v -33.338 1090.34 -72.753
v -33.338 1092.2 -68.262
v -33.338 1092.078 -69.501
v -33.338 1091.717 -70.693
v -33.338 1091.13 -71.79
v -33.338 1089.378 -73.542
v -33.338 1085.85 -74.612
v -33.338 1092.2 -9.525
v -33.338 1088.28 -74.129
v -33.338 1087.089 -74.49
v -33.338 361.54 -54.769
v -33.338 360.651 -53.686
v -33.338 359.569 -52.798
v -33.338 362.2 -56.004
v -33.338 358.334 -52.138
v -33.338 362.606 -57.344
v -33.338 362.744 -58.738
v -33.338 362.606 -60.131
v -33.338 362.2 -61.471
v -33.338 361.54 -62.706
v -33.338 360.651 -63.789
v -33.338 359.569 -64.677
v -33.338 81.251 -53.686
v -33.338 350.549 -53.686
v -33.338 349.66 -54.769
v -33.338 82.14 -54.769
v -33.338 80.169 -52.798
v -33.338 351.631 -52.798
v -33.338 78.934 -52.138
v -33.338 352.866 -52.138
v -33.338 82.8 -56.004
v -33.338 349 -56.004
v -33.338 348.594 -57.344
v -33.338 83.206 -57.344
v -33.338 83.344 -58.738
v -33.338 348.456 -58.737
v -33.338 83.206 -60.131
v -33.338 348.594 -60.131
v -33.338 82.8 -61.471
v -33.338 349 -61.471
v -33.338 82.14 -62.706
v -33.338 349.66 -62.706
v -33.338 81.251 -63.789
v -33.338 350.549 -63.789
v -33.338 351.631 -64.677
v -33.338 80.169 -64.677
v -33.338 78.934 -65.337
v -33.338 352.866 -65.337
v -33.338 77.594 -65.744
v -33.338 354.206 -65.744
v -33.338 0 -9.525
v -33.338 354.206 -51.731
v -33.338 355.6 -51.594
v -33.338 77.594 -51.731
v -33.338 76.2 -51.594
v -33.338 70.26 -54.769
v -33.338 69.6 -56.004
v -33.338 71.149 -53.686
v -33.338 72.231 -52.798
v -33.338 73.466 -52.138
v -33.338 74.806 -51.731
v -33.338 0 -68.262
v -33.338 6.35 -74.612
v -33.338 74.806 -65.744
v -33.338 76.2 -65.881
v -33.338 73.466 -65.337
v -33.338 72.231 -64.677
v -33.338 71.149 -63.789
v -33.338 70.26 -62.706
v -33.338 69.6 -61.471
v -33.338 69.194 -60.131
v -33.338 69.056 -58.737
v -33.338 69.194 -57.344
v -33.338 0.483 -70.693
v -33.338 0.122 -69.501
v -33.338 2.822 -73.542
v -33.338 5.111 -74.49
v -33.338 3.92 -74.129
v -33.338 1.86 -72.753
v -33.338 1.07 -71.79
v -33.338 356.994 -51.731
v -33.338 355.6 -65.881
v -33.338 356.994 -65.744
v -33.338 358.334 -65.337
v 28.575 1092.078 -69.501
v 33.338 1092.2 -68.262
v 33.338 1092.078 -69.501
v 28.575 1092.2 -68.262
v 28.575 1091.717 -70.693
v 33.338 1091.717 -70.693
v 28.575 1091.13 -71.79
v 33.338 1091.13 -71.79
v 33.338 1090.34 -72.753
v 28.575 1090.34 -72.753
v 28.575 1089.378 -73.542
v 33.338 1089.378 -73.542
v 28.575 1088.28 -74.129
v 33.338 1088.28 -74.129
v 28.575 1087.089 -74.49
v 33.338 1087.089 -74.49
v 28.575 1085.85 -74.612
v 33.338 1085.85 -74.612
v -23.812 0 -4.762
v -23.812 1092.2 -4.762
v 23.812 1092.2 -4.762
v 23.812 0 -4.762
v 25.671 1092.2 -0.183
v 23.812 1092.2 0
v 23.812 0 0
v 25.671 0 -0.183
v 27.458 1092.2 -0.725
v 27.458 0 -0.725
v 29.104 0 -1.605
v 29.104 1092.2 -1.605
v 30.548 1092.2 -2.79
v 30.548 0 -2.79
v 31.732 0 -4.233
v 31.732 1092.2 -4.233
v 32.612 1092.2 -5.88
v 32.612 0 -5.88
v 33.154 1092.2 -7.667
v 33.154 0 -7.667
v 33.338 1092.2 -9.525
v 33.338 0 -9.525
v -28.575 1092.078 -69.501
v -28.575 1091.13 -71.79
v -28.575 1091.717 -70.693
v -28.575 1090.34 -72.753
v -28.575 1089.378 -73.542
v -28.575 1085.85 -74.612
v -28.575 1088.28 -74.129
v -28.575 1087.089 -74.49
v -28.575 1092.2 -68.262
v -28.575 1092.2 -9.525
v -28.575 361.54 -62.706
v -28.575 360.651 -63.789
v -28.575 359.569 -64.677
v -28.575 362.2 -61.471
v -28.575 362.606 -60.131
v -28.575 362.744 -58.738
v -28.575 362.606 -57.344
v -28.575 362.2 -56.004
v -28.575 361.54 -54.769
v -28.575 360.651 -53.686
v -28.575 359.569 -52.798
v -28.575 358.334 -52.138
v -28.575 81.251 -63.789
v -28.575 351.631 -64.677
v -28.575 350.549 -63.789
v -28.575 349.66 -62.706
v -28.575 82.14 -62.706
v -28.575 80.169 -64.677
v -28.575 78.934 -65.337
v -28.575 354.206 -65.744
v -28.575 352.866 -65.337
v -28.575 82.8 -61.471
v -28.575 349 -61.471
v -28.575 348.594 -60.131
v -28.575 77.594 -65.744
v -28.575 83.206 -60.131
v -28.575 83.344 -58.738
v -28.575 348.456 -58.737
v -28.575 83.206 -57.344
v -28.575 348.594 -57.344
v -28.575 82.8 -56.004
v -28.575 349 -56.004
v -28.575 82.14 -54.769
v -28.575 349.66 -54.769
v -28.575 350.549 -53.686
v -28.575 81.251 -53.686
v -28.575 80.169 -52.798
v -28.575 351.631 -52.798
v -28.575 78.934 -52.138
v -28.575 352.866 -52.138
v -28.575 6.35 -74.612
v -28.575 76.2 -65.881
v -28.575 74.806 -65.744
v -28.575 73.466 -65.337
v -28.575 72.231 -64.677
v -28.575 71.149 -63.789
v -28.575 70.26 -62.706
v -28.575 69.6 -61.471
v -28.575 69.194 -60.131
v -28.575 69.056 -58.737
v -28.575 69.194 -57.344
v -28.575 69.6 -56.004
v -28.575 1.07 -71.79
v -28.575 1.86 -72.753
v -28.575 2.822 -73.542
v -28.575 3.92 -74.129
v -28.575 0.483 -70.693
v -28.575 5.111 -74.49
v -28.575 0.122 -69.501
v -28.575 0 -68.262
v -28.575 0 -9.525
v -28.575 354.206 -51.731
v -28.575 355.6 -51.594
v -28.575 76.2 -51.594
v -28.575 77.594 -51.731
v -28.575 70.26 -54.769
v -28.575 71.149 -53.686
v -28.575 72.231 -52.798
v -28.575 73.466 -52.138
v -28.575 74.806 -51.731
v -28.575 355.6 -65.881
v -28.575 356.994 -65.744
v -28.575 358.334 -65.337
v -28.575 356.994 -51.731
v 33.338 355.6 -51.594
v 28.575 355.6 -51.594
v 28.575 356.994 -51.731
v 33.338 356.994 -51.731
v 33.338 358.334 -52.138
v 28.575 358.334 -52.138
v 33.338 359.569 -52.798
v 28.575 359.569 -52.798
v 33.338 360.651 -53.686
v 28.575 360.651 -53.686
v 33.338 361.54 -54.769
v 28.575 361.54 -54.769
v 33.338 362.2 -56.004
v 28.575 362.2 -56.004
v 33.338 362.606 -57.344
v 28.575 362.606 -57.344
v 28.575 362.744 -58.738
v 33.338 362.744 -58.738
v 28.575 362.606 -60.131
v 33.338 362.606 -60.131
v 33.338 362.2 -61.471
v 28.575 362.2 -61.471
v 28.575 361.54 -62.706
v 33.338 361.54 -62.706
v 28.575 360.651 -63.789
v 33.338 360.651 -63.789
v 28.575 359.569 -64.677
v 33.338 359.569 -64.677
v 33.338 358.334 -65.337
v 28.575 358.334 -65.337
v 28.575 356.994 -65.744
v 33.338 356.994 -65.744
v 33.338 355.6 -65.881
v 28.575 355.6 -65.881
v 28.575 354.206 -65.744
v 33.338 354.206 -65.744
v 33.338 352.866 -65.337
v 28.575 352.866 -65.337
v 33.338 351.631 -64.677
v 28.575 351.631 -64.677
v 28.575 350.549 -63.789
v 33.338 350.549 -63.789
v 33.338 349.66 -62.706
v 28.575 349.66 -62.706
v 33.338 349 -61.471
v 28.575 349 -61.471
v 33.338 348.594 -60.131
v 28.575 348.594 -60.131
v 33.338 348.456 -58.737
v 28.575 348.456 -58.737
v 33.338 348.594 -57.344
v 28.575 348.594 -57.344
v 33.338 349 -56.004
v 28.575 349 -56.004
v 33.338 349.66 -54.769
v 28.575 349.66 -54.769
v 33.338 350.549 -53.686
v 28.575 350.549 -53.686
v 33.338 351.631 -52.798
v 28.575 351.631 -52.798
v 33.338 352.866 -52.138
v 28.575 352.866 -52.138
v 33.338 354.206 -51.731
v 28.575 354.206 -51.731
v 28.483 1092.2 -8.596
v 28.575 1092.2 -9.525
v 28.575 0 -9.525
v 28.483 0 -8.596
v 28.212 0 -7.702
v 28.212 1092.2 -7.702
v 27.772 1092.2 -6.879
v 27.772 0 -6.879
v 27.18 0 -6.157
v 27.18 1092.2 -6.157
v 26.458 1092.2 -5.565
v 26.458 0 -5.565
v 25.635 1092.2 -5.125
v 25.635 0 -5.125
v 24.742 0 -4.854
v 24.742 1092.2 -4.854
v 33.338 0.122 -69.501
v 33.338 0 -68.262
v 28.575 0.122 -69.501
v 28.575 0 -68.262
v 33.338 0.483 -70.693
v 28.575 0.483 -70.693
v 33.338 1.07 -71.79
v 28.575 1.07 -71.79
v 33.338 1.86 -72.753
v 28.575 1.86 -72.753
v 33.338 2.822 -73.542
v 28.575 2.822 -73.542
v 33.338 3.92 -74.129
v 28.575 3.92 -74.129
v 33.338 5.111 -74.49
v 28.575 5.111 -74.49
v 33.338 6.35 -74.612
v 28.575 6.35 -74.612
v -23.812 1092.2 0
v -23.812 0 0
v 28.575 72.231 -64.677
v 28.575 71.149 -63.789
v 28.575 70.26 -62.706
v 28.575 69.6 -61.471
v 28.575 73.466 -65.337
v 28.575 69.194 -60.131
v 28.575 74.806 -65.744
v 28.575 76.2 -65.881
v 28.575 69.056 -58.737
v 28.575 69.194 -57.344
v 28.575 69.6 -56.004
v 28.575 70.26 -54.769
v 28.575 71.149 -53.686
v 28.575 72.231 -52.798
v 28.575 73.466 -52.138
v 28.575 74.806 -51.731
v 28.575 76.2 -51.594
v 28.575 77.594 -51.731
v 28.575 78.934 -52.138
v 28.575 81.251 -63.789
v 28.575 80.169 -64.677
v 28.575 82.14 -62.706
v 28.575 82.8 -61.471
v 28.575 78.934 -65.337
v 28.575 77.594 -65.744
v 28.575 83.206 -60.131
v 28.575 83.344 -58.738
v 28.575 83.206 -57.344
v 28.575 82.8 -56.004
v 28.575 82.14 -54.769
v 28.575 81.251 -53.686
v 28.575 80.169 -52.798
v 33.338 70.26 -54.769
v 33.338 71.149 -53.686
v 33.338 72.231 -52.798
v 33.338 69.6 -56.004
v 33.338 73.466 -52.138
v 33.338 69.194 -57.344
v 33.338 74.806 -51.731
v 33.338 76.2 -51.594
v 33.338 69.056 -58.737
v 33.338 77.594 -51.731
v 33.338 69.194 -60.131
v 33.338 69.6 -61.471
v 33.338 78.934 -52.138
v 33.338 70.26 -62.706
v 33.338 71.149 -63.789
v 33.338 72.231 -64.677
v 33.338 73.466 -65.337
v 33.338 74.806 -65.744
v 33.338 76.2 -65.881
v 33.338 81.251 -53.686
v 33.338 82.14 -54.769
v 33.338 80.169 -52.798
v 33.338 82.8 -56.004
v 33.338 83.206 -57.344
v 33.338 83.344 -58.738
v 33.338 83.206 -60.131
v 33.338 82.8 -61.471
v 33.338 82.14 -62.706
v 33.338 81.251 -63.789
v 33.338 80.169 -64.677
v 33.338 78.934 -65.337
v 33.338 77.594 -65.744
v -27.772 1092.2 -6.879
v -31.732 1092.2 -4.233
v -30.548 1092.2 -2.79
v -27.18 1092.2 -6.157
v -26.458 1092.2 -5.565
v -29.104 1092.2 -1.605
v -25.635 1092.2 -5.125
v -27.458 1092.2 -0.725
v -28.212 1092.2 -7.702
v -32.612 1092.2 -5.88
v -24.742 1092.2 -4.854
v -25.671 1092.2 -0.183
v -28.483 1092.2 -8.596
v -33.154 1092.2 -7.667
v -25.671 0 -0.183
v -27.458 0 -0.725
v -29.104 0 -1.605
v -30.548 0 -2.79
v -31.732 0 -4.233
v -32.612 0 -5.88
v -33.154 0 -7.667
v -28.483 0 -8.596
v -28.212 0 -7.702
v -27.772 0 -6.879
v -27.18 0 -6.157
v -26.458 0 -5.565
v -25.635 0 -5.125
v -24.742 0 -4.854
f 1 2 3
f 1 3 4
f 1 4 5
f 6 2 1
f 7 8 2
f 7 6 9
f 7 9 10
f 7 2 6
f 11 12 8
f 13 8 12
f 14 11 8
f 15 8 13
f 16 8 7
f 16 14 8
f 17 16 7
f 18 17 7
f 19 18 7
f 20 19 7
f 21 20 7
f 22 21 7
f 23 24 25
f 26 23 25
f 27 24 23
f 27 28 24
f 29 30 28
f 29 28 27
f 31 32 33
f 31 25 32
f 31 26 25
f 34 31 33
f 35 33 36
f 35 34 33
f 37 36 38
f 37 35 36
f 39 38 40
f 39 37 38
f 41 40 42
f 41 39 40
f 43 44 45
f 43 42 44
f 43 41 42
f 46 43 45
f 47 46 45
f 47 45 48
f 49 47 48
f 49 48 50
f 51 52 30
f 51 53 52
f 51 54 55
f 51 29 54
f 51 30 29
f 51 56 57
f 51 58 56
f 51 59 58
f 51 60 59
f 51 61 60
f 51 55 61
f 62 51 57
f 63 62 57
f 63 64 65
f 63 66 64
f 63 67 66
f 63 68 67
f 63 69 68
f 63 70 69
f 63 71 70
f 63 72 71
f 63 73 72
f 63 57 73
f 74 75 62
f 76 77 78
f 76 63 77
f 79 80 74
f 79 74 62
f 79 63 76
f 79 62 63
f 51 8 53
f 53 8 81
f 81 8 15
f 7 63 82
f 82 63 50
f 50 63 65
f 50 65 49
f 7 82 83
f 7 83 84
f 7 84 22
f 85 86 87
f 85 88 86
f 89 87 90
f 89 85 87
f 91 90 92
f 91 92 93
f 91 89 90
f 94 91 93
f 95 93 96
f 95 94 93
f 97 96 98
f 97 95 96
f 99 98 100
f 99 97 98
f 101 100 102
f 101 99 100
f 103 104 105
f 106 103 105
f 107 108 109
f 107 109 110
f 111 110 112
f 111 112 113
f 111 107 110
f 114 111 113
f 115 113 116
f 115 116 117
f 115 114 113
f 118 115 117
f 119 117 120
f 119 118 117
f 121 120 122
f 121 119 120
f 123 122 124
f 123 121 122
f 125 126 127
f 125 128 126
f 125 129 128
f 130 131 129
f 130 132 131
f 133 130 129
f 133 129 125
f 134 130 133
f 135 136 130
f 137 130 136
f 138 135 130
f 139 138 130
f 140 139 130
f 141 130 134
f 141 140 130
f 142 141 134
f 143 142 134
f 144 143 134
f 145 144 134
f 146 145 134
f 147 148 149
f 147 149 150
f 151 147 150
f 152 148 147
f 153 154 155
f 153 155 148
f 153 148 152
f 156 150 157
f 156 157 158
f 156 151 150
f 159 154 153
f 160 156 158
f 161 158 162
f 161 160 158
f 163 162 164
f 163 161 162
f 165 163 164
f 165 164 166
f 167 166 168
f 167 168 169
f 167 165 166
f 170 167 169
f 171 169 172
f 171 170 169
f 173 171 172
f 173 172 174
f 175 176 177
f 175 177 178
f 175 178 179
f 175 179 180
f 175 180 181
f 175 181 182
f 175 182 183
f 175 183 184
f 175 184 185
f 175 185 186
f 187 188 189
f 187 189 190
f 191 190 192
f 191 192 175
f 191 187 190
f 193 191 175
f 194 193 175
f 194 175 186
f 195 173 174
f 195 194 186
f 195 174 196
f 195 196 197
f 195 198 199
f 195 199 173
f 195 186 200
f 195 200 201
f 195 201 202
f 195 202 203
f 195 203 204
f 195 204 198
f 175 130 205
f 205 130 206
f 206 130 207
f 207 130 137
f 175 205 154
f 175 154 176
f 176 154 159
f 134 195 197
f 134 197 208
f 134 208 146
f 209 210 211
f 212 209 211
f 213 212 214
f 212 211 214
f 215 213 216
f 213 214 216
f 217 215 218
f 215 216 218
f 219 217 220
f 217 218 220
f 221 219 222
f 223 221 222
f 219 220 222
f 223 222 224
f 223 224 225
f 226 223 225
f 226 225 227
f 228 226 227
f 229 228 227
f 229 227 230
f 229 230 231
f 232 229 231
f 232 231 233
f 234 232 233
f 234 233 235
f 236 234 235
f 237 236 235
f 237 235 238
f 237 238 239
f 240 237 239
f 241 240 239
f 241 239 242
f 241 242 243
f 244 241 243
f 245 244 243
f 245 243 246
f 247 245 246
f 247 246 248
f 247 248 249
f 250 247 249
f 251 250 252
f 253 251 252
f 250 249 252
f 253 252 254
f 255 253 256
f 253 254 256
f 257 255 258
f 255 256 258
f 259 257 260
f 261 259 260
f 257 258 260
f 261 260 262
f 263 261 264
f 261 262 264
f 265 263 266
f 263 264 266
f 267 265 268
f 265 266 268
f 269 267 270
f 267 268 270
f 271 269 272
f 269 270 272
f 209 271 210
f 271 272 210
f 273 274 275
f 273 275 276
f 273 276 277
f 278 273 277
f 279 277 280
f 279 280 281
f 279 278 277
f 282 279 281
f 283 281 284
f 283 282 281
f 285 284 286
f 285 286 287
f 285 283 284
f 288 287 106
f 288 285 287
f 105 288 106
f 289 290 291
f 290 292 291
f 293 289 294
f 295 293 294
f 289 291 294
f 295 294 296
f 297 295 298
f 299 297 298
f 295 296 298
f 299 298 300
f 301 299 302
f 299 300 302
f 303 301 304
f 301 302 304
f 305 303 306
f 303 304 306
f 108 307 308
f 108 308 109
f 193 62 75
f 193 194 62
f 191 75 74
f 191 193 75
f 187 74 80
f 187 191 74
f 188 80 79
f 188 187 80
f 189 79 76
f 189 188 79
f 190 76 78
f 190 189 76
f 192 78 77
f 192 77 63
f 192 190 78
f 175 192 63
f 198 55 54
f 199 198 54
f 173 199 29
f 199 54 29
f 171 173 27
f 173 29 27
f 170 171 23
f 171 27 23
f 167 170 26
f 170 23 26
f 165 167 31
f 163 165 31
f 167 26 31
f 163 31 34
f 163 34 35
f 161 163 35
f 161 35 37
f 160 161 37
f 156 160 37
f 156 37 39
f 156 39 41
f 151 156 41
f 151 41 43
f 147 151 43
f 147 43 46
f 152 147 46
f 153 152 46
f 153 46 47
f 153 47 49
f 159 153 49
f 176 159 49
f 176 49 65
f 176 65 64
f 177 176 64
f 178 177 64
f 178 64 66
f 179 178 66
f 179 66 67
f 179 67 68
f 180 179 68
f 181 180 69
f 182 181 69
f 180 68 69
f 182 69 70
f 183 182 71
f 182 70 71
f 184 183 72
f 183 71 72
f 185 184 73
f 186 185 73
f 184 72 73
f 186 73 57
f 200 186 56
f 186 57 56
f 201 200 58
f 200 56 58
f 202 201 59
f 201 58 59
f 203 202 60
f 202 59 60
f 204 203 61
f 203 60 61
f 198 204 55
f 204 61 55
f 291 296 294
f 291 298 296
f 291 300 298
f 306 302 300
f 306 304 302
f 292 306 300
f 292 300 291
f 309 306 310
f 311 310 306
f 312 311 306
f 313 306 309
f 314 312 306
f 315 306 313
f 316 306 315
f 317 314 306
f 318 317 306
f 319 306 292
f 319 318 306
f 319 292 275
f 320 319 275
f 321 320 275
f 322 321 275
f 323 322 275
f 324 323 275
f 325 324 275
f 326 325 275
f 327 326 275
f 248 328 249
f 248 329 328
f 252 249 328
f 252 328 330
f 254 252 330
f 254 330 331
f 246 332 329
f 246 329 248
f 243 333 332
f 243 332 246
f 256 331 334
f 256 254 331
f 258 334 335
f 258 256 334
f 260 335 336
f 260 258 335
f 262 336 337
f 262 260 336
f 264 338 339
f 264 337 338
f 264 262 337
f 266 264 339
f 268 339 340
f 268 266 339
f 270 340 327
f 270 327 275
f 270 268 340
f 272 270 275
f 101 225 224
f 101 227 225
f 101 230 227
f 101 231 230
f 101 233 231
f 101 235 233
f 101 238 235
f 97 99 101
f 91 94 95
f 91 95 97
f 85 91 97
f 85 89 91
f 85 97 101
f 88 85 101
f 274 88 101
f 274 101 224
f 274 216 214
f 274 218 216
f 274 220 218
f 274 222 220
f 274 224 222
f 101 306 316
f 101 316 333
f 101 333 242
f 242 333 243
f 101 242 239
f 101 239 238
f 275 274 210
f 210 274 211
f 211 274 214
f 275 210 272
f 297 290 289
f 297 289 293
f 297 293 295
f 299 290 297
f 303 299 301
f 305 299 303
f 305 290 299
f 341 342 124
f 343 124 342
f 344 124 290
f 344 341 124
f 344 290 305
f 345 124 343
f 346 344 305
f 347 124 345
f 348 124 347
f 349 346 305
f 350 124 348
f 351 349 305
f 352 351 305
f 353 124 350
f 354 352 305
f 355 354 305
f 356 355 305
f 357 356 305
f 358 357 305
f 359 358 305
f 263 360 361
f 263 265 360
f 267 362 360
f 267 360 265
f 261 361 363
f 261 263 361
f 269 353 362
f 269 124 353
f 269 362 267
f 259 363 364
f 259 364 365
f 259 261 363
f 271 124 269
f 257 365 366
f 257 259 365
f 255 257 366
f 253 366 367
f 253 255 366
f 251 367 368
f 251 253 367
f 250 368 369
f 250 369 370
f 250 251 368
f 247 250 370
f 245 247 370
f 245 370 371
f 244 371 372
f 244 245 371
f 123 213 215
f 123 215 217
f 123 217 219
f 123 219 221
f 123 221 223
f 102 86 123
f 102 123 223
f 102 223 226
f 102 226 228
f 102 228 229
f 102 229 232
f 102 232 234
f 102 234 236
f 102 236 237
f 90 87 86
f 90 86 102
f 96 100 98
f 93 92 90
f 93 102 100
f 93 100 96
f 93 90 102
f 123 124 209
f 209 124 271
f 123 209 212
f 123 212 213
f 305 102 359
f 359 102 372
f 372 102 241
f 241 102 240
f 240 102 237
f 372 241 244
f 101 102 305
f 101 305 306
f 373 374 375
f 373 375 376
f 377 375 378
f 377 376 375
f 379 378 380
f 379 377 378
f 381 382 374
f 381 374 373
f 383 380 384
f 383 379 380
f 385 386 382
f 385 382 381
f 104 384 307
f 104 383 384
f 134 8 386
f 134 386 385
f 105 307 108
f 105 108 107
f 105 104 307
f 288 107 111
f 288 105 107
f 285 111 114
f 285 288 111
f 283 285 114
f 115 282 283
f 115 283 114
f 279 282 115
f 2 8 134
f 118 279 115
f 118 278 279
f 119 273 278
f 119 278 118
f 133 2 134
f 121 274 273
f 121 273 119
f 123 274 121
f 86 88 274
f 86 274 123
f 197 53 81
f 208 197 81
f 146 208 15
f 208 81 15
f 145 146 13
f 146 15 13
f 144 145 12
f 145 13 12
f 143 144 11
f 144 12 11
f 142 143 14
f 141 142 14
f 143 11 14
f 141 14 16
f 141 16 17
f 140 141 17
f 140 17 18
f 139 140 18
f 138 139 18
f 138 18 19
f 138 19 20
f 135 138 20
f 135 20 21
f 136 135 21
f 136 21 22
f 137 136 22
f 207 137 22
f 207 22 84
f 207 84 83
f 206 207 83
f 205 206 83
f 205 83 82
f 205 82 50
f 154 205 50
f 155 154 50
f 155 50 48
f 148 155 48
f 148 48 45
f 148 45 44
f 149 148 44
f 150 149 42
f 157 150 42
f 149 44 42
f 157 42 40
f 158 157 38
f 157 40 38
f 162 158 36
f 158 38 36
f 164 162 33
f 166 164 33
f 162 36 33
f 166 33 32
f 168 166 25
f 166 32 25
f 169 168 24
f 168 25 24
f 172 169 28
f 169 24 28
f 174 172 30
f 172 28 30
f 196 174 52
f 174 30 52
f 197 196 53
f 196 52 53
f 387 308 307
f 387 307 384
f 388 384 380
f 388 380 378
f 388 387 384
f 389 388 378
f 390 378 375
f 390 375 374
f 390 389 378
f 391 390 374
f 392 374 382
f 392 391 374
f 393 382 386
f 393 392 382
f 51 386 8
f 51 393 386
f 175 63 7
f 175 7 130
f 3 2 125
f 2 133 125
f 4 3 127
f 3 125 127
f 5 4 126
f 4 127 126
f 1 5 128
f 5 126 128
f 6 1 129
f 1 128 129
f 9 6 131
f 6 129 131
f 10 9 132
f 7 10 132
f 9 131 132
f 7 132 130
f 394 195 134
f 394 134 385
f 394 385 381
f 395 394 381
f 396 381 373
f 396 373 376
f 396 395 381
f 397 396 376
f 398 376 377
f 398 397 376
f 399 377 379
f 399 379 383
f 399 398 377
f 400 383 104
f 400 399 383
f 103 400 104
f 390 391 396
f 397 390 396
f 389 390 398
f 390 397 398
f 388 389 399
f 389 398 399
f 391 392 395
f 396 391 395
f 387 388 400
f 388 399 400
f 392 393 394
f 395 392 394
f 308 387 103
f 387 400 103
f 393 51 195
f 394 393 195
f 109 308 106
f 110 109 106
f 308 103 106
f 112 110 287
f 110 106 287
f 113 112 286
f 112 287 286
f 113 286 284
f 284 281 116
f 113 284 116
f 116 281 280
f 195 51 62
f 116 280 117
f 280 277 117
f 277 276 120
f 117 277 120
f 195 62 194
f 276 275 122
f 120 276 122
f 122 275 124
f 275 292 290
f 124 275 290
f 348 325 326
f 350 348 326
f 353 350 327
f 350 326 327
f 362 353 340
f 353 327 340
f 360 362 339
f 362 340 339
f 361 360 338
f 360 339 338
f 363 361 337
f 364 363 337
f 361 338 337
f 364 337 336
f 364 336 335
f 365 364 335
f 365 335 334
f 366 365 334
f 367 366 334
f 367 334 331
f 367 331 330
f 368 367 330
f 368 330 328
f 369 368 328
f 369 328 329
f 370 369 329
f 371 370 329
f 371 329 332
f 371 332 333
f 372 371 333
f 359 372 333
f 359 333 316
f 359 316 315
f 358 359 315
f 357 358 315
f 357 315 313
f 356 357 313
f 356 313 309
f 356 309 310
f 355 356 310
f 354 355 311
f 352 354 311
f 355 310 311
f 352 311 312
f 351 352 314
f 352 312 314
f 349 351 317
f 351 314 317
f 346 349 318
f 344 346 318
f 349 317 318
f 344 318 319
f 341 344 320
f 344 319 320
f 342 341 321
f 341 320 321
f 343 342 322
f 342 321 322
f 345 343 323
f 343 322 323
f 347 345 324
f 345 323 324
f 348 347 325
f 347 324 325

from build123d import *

# Parameters (mm, degrees)
SKETCH1_W                      = 57.15
SKETCH1_H                      = 1092.2
BASE_FLANGE1_DEPTH             = 4.7625
EDGE_FLANGE1_STRIP_W           = 28.575
EDGE_FLANGE1_STRIP_H           = 4.7625
EDGE_FLANGE1_STRIP_CUT_DEPTH   = 1092.2
EDGE_FLANGE1_STRIP_2_W         = 28.575
EDGE_FLANGE1_STRIP_2_H         = 4.7625
EDGE_FLANGE1_STRIP_CUT_2_DEPTH = 1092.2
EDGE_FLANGE1_DEPTH             = 1092.2
EDGE_FLANGE1_BEND_DEPTH        = 1092.2
F_1_2_CLEARANCE_HOLE1_D        = 14.2875
FILLET1_R                      = 6.35


# Sheet-metal steps are written as plain solids
with BuildPart() as part:
    # Sketch1 → Base-Flange1 (new body)
    with BuildSketch(Plane.XY):
        with Locations((0, 546.1)):
            Rectangle(SKETCH1_W, SKETCH1_H)
    extrude(amount=-BASE_FLANGE1_DEPTH)

    # Edge-Flange1 strip (across the edge) → Edge-Flange1 strip cut (cut)
    with BuildSketch(Plane(origin=(-28.575, 0, -4.7625), x_dir=(1, 0, 0), z_dir=(0, 1, 0))):
        with Locations((-9.525, -2.38125)):
            Rectangle(EDGE_FLANGE1_STRIP_W, EDGE_FLANGE1_STRIP_H)
    extrude(amount=EDGE_FLANGE1_STRIP_CUT_DEPTH, mode=Mode.SUBTRACT)

    # Edge-Flange1 strip 2 (across the edge) → Edge-Flange1 strip cut 2 (cut)
    with BuildSketch(Plane(origin=(28.575, 1092.2, -4.7625), x_dir=(-1, 0, 0), z_dir=(0, -1, 0))):
        with Locations((-9.525, -2.38125)):
            Rectangle(EDGE_FLANGE1_STRIP_2_W, EDGE_FLANGE1_STRIP_2_H)
    extrude(amount=EDGE_FLANGE1_STRIP_CUT_2_DEPTH, mode=Mode.SUBTRACT)

    # Edge-Flange1 section (across the edge) → Edge-Flange1 (add)
    with BuildSketch(Plane(origin=(-28.575, 0, -4.7625), x_dir=(1, 0, 0), z_dir=(0, 1, 0))):
        with BuildLine():
            Line((-4.7625, 4.7625), (-4.7625, 69.85))
            Line((-4.7625, 69.85), (0, 69.85))
            Line((0, 69.85), (0, 4.7625))
            ThreePointArc((0, 4.7625), (1.394903955, 1.394903955), (4.7625, 0))
            Line((4.7625, 0), (4.7625, -4.7625))
            ThreePointArc((4.7625, -4.7625), (-1.972692091, -1.972692091), (-4.7625, 4.7625))
        make_face()
    extrude(amount=EDGE_FLANGE1_DEPTH)

    # Edge-Flange1 section 2 (across the edge) → Edge-Flange1 bend (add)
    with BuildSketch(Plane(origin=(28.575, 1092.2, -4.7625), x_dir=(-1, 0, 0), z_dir=(0, -1, 0))):
        with BuildLine():
            Line((-4.7625, 4.7625), (-4.7625, 69.85))
            Line((-4.7625, 69.85), (0, 69.85))
            Line((0, 69.85), (0, 4.7625))
            ThreePointArc((0, 4.7625), (1.394903955, 1.394903955), (4.7625, 0))
            Line((4.7625, 0), (4.7625, -4.7625))
            ThreePointArc((4.7625, -4.7625), (-1.972692091, -1.972692091), (-4.7625, 4.7625))
        make_face()
    extrude(amount=EDGE_FLANGE1_BEND_DEPTH)

    # 1/2 Clearance Hole1 (through all)
    with Locations(Plane(origin=(33.3375, 0, 0), x_dir=(0, 0, -1), z_dir=(1, 0, 0))):
        with Locations((58.7375, 76.2), (58.7375, 355.6)):
            Hole(F_1_2_CLEARANCE_HOLE1_D / 2)

    # Fillet1
    fillet1_edges = [part.edges().sort_by_distance(p)[0] for p in [
        (-30.95625, 0, -74.6125),
        (-30.95625, 1092.2, -74.6125),
        (30.95625, 1092.2, -74.6125),
        (30.95625, 0, -74.6125),
    ]]
    fillet(fillet1_edges, radius=FILLET1_R)


solid = part.part
